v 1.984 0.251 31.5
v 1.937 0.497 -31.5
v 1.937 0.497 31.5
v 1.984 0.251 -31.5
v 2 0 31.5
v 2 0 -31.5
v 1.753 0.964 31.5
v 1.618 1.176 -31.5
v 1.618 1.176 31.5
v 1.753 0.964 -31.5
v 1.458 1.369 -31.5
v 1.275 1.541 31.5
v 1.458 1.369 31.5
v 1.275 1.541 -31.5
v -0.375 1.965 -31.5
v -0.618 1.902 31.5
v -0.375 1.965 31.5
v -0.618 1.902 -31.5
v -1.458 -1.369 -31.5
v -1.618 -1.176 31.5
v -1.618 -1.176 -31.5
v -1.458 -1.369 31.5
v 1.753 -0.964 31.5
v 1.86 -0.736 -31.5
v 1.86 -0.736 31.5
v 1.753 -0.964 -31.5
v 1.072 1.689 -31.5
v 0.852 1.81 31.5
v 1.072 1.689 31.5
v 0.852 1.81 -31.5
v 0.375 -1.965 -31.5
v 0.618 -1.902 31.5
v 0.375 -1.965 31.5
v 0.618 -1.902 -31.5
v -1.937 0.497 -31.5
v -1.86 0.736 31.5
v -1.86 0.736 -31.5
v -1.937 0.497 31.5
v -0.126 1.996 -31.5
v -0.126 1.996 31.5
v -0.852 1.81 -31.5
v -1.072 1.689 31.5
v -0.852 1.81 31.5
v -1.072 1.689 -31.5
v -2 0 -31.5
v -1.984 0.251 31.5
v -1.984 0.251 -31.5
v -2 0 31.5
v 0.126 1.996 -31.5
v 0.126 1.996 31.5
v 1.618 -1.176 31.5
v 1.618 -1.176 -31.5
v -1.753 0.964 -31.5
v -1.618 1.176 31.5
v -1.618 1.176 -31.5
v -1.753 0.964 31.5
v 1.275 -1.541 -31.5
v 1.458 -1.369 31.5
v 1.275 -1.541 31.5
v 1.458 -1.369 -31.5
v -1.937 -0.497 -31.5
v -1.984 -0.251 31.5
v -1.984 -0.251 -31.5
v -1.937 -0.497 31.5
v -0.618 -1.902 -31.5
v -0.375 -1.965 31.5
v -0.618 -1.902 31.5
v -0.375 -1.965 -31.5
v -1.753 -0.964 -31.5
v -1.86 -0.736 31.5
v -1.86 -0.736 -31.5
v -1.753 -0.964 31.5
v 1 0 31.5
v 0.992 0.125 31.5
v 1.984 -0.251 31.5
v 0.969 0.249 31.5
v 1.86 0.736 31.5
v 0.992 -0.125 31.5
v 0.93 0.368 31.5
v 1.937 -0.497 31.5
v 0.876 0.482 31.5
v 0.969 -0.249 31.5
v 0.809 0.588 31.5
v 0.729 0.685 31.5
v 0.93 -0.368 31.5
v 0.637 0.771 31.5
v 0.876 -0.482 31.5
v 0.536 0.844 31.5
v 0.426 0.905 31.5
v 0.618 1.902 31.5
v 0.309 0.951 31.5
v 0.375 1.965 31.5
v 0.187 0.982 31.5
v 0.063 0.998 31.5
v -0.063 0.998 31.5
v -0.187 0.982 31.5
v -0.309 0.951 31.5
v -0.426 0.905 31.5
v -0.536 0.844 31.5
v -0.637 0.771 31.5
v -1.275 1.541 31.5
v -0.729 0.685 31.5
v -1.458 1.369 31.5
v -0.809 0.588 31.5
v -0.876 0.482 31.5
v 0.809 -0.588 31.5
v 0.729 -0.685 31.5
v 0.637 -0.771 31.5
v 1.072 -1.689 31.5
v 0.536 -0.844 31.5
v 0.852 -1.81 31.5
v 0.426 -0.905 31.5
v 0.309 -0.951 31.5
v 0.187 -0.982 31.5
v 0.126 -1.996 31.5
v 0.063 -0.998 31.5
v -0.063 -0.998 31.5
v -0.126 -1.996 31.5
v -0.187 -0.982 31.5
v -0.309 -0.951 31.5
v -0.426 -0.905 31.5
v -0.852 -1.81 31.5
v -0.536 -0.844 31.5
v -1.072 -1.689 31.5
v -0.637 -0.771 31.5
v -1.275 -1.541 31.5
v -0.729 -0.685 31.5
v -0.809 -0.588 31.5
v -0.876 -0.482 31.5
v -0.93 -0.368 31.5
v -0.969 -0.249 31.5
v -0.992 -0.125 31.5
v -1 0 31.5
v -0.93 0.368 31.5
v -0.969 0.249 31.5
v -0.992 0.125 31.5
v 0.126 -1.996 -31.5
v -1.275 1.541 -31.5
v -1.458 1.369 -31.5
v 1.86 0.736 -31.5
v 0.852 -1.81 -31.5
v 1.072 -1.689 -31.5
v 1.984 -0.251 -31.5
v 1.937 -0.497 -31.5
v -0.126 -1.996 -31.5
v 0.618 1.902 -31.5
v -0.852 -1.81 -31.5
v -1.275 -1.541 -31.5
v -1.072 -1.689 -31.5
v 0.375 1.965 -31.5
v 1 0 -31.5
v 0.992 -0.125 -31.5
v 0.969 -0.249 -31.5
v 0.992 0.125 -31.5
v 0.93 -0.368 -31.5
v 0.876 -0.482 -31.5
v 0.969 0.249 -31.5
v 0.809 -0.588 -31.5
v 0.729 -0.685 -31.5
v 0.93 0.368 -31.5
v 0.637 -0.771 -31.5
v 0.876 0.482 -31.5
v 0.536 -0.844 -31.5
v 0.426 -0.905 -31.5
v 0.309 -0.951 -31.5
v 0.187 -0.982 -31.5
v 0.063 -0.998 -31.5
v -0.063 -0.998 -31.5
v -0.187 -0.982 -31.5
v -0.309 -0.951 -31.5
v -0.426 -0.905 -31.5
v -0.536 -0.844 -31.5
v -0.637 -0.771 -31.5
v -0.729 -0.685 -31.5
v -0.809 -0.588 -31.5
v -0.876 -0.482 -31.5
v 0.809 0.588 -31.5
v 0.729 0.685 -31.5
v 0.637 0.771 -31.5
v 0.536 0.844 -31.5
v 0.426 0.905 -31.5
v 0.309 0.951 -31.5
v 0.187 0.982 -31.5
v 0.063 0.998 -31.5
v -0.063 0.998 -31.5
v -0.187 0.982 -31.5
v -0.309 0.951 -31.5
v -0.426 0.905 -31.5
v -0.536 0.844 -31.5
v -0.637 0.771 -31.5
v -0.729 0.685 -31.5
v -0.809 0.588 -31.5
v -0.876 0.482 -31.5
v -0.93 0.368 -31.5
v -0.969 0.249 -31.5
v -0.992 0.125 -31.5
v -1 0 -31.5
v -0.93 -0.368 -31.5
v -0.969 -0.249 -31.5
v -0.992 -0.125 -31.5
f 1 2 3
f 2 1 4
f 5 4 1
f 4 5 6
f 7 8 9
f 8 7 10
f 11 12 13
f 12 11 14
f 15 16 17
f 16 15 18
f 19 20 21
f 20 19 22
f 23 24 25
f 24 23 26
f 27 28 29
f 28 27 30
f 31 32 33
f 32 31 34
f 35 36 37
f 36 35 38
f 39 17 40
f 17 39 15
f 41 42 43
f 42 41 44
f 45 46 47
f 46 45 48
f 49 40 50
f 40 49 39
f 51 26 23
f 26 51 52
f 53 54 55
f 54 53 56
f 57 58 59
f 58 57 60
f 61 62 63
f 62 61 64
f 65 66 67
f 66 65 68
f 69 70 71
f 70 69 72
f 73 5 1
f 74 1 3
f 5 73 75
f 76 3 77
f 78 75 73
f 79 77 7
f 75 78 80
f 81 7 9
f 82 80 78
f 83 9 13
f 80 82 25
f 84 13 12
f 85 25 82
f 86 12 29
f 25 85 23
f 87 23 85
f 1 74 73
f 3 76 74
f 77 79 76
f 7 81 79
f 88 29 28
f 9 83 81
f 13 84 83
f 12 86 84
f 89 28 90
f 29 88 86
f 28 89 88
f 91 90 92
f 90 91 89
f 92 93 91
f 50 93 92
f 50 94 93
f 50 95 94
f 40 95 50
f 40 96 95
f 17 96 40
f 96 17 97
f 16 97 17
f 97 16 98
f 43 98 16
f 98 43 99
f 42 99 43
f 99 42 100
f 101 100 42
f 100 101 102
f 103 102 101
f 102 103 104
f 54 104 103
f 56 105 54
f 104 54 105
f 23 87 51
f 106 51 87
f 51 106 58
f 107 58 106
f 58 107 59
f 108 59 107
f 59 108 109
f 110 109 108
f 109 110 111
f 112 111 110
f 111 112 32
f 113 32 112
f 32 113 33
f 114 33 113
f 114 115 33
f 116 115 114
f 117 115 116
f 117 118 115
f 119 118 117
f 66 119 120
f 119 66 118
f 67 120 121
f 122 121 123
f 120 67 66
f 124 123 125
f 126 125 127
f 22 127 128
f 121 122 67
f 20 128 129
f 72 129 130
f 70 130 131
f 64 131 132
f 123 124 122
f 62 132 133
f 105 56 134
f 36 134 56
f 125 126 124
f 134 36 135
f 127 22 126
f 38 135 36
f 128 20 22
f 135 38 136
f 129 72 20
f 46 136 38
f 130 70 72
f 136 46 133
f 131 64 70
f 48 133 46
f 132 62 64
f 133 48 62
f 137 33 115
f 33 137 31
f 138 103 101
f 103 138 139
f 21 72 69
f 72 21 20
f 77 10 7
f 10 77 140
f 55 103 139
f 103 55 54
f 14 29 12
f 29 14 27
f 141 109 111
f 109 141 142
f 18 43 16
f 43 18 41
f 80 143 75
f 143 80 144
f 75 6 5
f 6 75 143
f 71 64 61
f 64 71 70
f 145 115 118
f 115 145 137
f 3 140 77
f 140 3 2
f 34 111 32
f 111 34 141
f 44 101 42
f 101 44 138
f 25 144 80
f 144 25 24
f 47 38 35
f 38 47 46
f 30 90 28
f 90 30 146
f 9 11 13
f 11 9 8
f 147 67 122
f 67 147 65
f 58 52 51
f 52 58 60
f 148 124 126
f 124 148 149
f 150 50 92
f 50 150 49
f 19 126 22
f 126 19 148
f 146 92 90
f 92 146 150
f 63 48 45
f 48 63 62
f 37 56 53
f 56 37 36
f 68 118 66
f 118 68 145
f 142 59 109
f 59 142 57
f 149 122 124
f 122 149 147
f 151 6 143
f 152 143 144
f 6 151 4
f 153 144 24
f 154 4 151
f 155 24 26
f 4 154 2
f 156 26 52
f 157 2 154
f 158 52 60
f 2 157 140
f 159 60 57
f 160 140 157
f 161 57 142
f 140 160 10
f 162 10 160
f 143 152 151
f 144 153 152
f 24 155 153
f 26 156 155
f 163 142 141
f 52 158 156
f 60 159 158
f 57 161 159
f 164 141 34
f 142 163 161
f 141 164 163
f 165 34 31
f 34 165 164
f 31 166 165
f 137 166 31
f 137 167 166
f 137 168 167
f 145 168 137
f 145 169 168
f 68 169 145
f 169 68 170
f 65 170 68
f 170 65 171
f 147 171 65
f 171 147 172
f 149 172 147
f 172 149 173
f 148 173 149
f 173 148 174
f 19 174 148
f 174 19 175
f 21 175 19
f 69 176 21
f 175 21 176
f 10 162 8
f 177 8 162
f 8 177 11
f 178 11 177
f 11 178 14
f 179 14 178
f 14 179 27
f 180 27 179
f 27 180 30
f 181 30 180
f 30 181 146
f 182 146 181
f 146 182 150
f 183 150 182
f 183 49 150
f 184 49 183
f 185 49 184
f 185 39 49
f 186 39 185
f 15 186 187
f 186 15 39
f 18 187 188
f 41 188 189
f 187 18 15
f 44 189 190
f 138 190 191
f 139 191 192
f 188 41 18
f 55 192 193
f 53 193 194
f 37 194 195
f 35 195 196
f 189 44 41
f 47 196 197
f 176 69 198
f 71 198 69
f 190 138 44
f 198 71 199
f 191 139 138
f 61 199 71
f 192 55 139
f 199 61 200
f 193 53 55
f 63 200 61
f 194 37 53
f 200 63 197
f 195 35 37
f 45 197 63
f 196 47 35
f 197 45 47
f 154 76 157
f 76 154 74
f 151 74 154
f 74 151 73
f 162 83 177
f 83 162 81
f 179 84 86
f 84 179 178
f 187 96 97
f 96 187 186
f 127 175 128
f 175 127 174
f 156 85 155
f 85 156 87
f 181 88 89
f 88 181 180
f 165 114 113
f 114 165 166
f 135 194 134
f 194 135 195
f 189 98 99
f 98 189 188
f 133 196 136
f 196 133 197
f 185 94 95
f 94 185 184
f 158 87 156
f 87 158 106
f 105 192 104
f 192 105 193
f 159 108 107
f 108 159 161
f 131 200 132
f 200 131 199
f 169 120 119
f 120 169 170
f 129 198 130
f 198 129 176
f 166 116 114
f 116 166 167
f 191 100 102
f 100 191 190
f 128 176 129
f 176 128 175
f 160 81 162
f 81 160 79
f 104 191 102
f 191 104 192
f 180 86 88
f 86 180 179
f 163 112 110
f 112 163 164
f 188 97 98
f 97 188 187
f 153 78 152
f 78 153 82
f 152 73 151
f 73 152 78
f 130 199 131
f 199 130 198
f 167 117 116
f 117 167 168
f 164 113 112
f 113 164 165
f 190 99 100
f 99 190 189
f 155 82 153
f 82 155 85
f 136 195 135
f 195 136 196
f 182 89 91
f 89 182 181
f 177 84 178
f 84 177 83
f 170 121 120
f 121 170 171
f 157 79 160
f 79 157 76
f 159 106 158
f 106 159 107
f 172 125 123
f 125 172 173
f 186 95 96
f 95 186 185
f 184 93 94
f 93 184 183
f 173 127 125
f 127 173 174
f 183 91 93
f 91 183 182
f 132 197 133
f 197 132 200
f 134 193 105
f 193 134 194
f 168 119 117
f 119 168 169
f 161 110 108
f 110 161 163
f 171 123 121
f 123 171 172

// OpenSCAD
$fn = 50;


difference() {
	union() {
		translate(v = [0, 0, -31.5000000000]) {
			cylinder(h = 63, r = 2.0000000000);
		}
	}
	union() {
		translate(v = [0, 0, -100.0000000000]) {
			cylinder(h = 200, r = 1.0000000000);
		}
	}
}
